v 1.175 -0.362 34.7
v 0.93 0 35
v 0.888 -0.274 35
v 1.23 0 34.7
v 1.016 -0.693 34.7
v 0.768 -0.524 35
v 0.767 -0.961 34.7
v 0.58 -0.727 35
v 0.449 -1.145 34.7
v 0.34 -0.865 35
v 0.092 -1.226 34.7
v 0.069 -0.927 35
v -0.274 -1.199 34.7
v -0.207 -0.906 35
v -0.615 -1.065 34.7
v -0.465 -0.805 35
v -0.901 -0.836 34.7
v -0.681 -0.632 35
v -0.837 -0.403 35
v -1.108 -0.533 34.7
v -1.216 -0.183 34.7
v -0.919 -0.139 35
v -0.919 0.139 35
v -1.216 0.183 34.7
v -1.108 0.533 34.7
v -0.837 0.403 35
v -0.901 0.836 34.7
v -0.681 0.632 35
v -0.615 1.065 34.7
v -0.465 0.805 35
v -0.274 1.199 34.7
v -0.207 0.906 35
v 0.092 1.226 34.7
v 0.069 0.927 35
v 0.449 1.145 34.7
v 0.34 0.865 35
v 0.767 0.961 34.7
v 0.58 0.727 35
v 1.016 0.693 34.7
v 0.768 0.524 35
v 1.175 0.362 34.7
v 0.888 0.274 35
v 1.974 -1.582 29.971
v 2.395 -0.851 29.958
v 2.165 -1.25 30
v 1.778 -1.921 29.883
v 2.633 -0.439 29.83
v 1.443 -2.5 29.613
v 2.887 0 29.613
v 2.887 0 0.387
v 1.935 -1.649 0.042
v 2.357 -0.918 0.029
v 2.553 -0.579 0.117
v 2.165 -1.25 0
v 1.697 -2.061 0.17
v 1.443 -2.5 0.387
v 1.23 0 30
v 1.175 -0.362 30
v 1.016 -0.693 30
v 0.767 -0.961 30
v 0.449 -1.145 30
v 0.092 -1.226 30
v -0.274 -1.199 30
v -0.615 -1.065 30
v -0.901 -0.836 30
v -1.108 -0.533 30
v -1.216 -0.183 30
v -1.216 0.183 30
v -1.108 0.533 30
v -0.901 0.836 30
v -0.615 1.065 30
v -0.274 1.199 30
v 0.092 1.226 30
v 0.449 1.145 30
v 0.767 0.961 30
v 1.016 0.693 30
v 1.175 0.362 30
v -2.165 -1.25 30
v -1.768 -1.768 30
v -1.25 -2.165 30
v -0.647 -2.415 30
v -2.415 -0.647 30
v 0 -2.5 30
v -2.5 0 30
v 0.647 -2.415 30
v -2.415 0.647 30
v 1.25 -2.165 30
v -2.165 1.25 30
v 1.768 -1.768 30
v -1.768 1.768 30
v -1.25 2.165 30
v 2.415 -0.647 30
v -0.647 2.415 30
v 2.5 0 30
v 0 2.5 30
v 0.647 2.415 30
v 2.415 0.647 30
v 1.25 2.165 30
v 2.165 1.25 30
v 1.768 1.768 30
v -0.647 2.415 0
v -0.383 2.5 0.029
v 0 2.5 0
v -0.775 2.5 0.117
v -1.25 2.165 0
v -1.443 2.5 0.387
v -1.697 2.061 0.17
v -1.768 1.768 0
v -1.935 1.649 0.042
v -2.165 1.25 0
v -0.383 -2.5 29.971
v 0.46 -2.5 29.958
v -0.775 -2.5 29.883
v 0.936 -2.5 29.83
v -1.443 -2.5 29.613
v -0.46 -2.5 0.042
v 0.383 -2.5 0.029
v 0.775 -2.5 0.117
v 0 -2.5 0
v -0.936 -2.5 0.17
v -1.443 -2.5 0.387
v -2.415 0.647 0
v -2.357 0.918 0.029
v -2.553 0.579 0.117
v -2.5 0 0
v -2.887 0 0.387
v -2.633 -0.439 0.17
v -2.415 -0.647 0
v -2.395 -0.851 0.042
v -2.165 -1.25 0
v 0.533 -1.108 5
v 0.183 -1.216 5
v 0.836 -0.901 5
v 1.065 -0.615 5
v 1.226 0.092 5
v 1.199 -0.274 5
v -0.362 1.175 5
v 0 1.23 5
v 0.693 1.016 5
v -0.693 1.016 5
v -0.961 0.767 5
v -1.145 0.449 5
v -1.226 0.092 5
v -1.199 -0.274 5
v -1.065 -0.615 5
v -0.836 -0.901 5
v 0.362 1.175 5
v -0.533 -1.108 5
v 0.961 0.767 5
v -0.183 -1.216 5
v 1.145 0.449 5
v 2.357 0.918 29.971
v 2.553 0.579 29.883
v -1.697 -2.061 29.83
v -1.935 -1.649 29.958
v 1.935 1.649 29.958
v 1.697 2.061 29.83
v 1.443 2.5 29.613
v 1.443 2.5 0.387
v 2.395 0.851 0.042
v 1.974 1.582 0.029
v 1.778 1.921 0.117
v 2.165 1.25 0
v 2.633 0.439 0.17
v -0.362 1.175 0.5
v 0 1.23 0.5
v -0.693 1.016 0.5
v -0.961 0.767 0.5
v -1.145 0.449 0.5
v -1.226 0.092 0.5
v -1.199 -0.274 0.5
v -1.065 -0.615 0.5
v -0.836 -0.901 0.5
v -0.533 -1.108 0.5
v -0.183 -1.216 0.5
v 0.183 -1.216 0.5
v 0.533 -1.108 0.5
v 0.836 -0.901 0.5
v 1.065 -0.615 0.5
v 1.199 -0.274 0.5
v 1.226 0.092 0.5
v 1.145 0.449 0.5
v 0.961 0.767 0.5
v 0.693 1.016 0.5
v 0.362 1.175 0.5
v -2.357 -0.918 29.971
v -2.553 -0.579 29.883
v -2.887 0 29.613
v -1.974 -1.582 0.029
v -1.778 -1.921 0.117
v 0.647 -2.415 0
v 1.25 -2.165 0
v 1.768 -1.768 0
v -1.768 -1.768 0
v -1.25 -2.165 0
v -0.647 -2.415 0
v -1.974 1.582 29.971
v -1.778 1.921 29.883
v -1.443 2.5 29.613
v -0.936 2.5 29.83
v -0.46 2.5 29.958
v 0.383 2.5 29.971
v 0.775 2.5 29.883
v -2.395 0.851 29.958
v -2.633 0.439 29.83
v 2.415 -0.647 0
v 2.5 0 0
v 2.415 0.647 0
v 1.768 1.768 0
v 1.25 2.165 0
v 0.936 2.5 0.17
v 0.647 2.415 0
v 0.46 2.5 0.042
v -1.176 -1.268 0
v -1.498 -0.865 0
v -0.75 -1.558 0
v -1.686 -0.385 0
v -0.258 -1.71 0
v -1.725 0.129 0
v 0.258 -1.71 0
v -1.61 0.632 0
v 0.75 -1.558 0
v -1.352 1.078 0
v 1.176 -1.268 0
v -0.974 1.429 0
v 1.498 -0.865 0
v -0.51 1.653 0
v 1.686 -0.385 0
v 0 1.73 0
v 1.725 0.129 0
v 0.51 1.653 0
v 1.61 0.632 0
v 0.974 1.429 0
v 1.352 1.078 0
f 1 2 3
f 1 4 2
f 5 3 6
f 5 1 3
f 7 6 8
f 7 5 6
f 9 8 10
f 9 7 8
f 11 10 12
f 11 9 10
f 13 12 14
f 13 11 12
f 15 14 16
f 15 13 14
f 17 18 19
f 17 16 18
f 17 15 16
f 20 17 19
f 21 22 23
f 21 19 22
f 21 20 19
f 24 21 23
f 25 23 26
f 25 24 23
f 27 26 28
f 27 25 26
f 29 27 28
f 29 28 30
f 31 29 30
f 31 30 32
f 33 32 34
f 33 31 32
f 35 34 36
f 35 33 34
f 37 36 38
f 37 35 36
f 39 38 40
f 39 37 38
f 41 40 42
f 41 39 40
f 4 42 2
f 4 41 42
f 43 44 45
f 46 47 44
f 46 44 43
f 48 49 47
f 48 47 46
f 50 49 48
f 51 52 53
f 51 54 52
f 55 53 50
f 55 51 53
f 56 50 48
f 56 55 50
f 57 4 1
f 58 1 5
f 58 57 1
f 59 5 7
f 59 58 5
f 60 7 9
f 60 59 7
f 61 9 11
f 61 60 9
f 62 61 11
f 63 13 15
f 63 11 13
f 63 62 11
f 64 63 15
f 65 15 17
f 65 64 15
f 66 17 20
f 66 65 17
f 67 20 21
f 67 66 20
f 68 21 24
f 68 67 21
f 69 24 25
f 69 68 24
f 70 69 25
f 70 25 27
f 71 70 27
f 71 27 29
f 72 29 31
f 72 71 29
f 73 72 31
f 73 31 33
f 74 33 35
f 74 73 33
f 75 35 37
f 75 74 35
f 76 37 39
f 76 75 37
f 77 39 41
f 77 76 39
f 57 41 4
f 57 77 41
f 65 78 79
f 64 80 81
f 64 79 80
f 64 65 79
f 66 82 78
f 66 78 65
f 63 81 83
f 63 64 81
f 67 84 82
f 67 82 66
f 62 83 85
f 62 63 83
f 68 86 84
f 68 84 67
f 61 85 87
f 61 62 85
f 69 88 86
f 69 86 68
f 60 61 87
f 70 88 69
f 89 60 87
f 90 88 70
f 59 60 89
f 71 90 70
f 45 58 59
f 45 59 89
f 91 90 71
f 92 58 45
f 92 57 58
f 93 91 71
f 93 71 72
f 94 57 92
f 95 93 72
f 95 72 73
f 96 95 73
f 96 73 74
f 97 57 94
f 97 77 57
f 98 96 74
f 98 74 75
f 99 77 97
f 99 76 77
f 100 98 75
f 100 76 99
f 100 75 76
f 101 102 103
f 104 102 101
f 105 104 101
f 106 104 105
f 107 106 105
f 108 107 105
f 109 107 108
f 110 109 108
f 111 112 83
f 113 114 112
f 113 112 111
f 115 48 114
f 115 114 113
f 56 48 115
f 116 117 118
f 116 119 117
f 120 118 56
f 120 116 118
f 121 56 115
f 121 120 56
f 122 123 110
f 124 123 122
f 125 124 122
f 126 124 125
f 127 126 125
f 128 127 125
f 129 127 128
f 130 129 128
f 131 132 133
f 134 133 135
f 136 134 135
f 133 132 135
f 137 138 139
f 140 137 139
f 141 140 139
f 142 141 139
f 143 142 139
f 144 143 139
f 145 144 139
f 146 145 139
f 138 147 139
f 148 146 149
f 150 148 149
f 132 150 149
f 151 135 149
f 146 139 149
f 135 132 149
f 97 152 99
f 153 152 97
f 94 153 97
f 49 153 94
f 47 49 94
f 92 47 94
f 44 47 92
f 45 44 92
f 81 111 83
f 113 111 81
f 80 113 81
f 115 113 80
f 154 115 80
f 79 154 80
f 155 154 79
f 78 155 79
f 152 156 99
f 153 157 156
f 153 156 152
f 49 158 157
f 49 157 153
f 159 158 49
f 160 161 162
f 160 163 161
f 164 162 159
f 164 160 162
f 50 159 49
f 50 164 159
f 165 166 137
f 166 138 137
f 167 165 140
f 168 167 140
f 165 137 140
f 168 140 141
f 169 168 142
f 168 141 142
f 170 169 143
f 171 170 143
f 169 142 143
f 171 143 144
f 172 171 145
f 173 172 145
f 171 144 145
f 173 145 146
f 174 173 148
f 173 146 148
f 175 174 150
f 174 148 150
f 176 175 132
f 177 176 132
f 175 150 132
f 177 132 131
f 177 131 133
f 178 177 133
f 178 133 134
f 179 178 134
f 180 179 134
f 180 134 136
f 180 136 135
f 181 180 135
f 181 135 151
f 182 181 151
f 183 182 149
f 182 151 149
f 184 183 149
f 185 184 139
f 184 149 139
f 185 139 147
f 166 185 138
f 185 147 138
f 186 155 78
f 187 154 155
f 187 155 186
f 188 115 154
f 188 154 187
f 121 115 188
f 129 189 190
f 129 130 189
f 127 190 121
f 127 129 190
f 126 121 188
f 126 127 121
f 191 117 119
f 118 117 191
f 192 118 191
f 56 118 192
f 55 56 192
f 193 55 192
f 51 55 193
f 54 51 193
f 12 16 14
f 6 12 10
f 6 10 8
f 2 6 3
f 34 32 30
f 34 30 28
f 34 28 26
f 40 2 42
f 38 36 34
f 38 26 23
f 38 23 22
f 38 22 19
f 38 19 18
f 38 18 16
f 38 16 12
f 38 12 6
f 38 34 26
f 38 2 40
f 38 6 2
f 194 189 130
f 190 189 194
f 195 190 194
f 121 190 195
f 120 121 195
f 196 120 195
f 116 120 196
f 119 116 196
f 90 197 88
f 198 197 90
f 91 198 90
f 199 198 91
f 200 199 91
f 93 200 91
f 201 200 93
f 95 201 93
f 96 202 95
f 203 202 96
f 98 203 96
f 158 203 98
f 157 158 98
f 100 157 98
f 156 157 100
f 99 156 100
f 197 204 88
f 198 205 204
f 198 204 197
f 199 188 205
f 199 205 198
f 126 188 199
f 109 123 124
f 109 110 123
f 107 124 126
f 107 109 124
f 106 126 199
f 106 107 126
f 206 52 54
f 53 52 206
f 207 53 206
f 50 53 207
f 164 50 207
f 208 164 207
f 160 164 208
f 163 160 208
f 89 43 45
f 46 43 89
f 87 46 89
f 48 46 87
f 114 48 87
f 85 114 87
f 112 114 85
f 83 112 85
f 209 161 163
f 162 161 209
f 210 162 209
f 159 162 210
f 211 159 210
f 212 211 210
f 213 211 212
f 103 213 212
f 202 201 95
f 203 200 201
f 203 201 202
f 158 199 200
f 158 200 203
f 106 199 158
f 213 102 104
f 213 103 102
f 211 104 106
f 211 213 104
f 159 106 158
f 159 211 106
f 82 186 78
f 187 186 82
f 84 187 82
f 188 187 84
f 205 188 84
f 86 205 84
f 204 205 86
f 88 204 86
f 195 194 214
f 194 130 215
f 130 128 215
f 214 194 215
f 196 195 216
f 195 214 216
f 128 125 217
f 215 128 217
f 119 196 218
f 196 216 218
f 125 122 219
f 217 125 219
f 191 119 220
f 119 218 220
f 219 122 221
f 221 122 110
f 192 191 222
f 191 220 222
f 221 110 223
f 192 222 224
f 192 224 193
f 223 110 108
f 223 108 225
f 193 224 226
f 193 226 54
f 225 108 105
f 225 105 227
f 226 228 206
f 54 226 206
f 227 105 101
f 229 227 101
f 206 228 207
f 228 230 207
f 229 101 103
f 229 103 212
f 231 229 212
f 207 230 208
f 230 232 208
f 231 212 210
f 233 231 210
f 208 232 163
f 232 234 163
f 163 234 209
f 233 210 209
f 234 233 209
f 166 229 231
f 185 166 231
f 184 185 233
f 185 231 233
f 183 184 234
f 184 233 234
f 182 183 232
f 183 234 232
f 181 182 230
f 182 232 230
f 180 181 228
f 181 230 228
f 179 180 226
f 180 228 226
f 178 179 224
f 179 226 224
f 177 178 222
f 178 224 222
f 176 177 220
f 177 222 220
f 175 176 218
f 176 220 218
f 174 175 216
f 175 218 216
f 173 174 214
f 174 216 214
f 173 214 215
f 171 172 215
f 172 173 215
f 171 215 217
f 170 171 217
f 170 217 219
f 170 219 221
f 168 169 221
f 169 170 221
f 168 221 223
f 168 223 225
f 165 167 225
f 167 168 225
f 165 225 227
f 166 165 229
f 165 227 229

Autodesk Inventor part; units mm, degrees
ref_plane "YZ Plane" through (0, 0, 0) normal (1, 0, 0) x (0, 1, 0)
ref_plane "XZ Plane" through (0, 0, 0) normal (0, 1, 0) x (-1, 0, 0)
ref_plane "XY Plane" through (0, 0, 0) normal (0, 0, 1) x (1, 0, 0)
sketch "Sketch1" plane through (0, 0, 0) normal (0, 0, 1) x (1, 0, 0)
  line L0 (1.4434, 2.5) -> (2.8868, 0)
  line L1 (2.8868, 0) -> (1.4434, -2.5)
  line L2 (1.4434, -2.5) -> (-1.4434, -2.5)
  line L3 (-1.4434, -2.5) -> (-2.8868, 0)
  line L4 (-2.8868, 0) -> (-1.4434, 2.5)
  line L5 (-1.4434, 2.5) -> (1.4434, 2.5)
  point P0 (0, 0)
  point P1 (0, 0)
  dimension "d0" = 5
extrude "Extrusion1" add sketch "Sketch1" along normal blind 30
sketch "Sketch3" plane through (0, 0, 0) normal (0, 0, -1) x (-1, 0, 0)
  line L0 (1.4434, 2.5) -> (-1.4434, 2.5) projected
  circle A0 centre (0, 0) radius 2.5
hole "Hole1" at (0, 0, 0) direction (0, 0, 1) diameter 2.459 end through all thread size "M3x0.5" class "6H" standard "ISO Metric profile"
chamfer "Chamfer2" distance 0.5 angle 45 1 edges at (0, -1.2295, 0)
sketch "Sketch4" plane through (0, 0, 0) normal (0, 0, -1) x (-1, 0, 0)
  circle A0 centre (0, 0) radius 1.7295 projected
  circle A1 centre (0, 0) radius 2.5
  circle A2 centre (0, 0) radius 6
extrude "Extrusion3" cut sketch "Sketch4" against normal blind 1 draft -45 contours A2
ref_plane "Work Plane1" through (0, 0, 15) normal (0, 0, -1) x (-1, 0, 0)
mirror "Mirror2" about plane through (0, 0, 15) normal (0, 0, -1) of "Extrusion3"
sketch "Sketch5" plane through (0, 0, 30) normal (0, 0, 1) x (1, 0, 0)
  circle A0 centre (0, 0) radius 1.2295 projected
extrude "Extrusion4" add sketch "Sketch5" along normal blind 5 and the other way blind 25
thread "Thread2" size "M2.5x0.45" class "6g" standard "ANSI Metric M Profile" full length
chamfer "Chamfer4" distance 0.3 angle 45 1 edges at (-1.2295, 0, 35)
properties part number "support m3 10" material "Stainless Steel"
